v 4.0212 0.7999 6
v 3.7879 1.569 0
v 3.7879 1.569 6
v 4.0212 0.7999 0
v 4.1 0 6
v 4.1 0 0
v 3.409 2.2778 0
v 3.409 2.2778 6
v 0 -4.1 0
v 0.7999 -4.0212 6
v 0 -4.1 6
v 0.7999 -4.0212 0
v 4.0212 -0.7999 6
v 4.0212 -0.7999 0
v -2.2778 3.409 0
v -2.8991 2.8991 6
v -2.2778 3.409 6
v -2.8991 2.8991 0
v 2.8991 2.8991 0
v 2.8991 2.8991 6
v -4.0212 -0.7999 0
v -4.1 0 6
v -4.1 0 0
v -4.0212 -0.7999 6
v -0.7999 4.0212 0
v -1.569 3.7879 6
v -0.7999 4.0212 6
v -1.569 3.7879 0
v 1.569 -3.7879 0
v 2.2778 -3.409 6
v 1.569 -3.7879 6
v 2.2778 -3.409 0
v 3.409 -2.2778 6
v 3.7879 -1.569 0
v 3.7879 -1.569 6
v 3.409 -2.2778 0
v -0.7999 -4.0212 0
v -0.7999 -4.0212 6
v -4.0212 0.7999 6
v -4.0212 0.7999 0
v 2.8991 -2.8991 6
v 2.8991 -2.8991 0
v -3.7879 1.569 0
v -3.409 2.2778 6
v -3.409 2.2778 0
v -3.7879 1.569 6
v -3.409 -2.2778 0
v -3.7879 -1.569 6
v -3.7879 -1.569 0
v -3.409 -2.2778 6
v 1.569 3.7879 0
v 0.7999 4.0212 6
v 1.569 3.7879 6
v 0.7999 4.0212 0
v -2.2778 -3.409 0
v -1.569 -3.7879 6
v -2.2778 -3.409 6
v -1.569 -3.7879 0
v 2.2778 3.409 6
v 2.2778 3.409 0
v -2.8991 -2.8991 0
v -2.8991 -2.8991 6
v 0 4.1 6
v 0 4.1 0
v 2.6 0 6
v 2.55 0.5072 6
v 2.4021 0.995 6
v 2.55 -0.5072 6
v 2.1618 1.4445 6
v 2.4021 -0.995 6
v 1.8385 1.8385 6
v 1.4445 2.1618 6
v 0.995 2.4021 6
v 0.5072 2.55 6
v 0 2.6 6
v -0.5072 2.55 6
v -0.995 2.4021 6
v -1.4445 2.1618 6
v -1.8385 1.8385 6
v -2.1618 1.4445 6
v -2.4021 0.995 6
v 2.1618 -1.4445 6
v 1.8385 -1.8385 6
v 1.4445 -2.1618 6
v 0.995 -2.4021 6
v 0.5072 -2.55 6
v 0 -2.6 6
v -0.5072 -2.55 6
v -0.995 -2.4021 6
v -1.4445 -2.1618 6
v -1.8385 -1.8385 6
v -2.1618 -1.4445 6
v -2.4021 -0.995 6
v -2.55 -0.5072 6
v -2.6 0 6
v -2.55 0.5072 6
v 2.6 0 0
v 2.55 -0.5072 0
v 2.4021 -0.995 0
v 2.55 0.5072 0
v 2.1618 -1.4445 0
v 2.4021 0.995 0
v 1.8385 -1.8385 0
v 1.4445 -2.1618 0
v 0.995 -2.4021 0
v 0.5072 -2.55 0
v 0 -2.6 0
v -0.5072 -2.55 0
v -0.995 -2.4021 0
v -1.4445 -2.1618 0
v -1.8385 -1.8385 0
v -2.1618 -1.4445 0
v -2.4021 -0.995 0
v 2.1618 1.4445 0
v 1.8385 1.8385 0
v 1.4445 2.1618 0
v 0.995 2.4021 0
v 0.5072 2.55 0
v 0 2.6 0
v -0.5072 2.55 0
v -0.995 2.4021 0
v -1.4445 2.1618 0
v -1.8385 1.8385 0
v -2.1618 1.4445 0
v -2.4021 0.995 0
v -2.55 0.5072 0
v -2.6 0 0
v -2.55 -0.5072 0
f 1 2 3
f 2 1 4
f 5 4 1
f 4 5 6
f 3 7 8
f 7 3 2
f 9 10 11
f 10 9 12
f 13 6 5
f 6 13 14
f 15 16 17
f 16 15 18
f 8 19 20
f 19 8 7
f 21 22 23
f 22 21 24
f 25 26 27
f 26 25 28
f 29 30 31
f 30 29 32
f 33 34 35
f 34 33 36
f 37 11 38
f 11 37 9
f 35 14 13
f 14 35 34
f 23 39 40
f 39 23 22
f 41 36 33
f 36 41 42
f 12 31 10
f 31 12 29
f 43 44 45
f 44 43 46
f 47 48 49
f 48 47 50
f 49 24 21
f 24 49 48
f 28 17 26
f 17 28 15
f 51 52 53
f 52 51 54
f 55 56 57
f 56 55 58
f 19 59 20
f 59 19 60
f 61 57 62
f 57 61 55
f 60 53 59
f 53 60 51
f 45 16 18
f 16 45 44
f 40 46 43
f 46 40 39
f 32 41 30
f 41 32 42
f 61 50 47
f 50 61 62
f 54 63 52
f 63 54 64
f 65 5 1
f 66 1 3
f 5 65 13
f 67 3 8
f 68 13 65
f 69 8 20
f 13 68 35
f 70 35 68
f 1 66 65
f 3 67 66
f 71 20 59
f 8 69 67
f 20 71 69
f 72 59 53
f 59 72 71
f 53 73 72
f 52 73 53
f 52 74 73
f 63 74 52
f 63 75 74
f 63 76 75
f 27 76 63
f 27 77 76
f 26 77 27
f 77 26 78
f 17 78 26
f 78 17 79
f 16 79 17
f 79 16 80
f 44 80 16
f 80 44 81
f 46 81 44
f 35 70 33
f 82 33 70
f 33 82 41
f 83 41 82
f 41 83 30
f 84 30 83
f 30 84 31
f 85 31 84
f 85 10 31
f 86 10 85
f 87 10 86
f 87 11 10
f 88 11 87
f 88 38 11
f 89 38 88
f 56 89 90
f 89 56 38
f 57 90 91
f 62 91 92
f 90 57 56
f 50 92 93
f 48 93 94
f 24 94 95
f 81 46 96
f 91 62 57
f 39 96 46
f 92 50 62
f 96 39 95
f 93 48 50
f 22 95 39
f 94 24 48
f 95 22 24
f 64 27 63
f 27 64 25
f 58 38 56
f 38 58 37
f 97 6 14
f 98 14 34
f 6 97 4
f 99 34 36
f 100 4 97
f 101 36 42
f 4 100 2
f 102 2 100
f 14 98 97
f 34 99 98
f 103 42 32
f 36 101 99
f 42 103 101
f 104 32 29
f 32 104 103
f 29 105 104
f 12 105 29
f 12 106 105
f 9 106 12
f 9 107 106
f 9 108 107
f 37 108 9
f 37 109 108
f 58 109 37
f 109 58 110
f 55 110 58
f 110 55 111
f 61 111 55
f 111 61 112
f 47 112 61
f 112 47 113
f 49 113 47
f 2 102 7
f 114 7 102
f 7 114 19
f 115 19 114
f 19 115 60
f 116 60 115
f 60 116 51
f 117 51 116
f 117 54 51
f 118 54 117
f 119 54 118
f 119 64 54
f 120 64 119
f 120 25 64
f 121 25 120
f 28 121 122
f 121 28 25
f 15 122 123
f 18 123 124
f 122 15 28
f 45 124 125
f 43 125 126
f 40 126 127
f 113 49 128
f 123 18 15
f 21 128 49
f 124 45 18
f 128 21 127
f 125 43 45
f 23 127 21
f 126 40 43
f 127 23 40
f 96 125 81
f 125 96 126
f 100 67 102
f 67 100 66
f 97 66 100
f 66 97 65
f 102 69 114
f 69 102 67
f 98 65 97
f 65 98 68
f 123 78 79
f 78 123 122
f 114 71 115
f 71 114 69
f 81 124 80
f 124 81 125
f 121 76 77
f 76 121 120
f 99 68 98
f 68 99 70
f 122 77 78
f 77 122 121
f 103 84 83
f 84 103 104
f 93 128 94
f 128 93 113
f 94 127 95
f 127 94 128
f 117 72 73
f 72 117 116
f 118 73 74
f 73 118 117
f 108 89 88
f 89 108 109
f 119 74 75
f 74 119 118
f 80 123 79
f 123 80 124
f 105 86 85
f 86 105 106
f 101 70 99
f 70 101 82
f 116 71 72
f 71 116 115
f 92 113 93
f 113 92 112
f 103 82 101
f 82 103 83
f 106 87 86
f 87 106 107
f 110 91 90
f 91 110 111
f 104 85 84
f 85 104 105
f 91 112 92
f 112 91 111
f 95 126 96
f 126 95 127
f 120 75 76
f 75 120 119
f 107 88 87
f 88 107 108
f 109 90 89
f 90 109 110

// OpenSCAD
$fn=32;

difference(){
  cylinder(r=(5.2+3)/2, h=6);
  translate([0,0,-1])
    cylinder(r=(5.2)/2, h=8);
}
